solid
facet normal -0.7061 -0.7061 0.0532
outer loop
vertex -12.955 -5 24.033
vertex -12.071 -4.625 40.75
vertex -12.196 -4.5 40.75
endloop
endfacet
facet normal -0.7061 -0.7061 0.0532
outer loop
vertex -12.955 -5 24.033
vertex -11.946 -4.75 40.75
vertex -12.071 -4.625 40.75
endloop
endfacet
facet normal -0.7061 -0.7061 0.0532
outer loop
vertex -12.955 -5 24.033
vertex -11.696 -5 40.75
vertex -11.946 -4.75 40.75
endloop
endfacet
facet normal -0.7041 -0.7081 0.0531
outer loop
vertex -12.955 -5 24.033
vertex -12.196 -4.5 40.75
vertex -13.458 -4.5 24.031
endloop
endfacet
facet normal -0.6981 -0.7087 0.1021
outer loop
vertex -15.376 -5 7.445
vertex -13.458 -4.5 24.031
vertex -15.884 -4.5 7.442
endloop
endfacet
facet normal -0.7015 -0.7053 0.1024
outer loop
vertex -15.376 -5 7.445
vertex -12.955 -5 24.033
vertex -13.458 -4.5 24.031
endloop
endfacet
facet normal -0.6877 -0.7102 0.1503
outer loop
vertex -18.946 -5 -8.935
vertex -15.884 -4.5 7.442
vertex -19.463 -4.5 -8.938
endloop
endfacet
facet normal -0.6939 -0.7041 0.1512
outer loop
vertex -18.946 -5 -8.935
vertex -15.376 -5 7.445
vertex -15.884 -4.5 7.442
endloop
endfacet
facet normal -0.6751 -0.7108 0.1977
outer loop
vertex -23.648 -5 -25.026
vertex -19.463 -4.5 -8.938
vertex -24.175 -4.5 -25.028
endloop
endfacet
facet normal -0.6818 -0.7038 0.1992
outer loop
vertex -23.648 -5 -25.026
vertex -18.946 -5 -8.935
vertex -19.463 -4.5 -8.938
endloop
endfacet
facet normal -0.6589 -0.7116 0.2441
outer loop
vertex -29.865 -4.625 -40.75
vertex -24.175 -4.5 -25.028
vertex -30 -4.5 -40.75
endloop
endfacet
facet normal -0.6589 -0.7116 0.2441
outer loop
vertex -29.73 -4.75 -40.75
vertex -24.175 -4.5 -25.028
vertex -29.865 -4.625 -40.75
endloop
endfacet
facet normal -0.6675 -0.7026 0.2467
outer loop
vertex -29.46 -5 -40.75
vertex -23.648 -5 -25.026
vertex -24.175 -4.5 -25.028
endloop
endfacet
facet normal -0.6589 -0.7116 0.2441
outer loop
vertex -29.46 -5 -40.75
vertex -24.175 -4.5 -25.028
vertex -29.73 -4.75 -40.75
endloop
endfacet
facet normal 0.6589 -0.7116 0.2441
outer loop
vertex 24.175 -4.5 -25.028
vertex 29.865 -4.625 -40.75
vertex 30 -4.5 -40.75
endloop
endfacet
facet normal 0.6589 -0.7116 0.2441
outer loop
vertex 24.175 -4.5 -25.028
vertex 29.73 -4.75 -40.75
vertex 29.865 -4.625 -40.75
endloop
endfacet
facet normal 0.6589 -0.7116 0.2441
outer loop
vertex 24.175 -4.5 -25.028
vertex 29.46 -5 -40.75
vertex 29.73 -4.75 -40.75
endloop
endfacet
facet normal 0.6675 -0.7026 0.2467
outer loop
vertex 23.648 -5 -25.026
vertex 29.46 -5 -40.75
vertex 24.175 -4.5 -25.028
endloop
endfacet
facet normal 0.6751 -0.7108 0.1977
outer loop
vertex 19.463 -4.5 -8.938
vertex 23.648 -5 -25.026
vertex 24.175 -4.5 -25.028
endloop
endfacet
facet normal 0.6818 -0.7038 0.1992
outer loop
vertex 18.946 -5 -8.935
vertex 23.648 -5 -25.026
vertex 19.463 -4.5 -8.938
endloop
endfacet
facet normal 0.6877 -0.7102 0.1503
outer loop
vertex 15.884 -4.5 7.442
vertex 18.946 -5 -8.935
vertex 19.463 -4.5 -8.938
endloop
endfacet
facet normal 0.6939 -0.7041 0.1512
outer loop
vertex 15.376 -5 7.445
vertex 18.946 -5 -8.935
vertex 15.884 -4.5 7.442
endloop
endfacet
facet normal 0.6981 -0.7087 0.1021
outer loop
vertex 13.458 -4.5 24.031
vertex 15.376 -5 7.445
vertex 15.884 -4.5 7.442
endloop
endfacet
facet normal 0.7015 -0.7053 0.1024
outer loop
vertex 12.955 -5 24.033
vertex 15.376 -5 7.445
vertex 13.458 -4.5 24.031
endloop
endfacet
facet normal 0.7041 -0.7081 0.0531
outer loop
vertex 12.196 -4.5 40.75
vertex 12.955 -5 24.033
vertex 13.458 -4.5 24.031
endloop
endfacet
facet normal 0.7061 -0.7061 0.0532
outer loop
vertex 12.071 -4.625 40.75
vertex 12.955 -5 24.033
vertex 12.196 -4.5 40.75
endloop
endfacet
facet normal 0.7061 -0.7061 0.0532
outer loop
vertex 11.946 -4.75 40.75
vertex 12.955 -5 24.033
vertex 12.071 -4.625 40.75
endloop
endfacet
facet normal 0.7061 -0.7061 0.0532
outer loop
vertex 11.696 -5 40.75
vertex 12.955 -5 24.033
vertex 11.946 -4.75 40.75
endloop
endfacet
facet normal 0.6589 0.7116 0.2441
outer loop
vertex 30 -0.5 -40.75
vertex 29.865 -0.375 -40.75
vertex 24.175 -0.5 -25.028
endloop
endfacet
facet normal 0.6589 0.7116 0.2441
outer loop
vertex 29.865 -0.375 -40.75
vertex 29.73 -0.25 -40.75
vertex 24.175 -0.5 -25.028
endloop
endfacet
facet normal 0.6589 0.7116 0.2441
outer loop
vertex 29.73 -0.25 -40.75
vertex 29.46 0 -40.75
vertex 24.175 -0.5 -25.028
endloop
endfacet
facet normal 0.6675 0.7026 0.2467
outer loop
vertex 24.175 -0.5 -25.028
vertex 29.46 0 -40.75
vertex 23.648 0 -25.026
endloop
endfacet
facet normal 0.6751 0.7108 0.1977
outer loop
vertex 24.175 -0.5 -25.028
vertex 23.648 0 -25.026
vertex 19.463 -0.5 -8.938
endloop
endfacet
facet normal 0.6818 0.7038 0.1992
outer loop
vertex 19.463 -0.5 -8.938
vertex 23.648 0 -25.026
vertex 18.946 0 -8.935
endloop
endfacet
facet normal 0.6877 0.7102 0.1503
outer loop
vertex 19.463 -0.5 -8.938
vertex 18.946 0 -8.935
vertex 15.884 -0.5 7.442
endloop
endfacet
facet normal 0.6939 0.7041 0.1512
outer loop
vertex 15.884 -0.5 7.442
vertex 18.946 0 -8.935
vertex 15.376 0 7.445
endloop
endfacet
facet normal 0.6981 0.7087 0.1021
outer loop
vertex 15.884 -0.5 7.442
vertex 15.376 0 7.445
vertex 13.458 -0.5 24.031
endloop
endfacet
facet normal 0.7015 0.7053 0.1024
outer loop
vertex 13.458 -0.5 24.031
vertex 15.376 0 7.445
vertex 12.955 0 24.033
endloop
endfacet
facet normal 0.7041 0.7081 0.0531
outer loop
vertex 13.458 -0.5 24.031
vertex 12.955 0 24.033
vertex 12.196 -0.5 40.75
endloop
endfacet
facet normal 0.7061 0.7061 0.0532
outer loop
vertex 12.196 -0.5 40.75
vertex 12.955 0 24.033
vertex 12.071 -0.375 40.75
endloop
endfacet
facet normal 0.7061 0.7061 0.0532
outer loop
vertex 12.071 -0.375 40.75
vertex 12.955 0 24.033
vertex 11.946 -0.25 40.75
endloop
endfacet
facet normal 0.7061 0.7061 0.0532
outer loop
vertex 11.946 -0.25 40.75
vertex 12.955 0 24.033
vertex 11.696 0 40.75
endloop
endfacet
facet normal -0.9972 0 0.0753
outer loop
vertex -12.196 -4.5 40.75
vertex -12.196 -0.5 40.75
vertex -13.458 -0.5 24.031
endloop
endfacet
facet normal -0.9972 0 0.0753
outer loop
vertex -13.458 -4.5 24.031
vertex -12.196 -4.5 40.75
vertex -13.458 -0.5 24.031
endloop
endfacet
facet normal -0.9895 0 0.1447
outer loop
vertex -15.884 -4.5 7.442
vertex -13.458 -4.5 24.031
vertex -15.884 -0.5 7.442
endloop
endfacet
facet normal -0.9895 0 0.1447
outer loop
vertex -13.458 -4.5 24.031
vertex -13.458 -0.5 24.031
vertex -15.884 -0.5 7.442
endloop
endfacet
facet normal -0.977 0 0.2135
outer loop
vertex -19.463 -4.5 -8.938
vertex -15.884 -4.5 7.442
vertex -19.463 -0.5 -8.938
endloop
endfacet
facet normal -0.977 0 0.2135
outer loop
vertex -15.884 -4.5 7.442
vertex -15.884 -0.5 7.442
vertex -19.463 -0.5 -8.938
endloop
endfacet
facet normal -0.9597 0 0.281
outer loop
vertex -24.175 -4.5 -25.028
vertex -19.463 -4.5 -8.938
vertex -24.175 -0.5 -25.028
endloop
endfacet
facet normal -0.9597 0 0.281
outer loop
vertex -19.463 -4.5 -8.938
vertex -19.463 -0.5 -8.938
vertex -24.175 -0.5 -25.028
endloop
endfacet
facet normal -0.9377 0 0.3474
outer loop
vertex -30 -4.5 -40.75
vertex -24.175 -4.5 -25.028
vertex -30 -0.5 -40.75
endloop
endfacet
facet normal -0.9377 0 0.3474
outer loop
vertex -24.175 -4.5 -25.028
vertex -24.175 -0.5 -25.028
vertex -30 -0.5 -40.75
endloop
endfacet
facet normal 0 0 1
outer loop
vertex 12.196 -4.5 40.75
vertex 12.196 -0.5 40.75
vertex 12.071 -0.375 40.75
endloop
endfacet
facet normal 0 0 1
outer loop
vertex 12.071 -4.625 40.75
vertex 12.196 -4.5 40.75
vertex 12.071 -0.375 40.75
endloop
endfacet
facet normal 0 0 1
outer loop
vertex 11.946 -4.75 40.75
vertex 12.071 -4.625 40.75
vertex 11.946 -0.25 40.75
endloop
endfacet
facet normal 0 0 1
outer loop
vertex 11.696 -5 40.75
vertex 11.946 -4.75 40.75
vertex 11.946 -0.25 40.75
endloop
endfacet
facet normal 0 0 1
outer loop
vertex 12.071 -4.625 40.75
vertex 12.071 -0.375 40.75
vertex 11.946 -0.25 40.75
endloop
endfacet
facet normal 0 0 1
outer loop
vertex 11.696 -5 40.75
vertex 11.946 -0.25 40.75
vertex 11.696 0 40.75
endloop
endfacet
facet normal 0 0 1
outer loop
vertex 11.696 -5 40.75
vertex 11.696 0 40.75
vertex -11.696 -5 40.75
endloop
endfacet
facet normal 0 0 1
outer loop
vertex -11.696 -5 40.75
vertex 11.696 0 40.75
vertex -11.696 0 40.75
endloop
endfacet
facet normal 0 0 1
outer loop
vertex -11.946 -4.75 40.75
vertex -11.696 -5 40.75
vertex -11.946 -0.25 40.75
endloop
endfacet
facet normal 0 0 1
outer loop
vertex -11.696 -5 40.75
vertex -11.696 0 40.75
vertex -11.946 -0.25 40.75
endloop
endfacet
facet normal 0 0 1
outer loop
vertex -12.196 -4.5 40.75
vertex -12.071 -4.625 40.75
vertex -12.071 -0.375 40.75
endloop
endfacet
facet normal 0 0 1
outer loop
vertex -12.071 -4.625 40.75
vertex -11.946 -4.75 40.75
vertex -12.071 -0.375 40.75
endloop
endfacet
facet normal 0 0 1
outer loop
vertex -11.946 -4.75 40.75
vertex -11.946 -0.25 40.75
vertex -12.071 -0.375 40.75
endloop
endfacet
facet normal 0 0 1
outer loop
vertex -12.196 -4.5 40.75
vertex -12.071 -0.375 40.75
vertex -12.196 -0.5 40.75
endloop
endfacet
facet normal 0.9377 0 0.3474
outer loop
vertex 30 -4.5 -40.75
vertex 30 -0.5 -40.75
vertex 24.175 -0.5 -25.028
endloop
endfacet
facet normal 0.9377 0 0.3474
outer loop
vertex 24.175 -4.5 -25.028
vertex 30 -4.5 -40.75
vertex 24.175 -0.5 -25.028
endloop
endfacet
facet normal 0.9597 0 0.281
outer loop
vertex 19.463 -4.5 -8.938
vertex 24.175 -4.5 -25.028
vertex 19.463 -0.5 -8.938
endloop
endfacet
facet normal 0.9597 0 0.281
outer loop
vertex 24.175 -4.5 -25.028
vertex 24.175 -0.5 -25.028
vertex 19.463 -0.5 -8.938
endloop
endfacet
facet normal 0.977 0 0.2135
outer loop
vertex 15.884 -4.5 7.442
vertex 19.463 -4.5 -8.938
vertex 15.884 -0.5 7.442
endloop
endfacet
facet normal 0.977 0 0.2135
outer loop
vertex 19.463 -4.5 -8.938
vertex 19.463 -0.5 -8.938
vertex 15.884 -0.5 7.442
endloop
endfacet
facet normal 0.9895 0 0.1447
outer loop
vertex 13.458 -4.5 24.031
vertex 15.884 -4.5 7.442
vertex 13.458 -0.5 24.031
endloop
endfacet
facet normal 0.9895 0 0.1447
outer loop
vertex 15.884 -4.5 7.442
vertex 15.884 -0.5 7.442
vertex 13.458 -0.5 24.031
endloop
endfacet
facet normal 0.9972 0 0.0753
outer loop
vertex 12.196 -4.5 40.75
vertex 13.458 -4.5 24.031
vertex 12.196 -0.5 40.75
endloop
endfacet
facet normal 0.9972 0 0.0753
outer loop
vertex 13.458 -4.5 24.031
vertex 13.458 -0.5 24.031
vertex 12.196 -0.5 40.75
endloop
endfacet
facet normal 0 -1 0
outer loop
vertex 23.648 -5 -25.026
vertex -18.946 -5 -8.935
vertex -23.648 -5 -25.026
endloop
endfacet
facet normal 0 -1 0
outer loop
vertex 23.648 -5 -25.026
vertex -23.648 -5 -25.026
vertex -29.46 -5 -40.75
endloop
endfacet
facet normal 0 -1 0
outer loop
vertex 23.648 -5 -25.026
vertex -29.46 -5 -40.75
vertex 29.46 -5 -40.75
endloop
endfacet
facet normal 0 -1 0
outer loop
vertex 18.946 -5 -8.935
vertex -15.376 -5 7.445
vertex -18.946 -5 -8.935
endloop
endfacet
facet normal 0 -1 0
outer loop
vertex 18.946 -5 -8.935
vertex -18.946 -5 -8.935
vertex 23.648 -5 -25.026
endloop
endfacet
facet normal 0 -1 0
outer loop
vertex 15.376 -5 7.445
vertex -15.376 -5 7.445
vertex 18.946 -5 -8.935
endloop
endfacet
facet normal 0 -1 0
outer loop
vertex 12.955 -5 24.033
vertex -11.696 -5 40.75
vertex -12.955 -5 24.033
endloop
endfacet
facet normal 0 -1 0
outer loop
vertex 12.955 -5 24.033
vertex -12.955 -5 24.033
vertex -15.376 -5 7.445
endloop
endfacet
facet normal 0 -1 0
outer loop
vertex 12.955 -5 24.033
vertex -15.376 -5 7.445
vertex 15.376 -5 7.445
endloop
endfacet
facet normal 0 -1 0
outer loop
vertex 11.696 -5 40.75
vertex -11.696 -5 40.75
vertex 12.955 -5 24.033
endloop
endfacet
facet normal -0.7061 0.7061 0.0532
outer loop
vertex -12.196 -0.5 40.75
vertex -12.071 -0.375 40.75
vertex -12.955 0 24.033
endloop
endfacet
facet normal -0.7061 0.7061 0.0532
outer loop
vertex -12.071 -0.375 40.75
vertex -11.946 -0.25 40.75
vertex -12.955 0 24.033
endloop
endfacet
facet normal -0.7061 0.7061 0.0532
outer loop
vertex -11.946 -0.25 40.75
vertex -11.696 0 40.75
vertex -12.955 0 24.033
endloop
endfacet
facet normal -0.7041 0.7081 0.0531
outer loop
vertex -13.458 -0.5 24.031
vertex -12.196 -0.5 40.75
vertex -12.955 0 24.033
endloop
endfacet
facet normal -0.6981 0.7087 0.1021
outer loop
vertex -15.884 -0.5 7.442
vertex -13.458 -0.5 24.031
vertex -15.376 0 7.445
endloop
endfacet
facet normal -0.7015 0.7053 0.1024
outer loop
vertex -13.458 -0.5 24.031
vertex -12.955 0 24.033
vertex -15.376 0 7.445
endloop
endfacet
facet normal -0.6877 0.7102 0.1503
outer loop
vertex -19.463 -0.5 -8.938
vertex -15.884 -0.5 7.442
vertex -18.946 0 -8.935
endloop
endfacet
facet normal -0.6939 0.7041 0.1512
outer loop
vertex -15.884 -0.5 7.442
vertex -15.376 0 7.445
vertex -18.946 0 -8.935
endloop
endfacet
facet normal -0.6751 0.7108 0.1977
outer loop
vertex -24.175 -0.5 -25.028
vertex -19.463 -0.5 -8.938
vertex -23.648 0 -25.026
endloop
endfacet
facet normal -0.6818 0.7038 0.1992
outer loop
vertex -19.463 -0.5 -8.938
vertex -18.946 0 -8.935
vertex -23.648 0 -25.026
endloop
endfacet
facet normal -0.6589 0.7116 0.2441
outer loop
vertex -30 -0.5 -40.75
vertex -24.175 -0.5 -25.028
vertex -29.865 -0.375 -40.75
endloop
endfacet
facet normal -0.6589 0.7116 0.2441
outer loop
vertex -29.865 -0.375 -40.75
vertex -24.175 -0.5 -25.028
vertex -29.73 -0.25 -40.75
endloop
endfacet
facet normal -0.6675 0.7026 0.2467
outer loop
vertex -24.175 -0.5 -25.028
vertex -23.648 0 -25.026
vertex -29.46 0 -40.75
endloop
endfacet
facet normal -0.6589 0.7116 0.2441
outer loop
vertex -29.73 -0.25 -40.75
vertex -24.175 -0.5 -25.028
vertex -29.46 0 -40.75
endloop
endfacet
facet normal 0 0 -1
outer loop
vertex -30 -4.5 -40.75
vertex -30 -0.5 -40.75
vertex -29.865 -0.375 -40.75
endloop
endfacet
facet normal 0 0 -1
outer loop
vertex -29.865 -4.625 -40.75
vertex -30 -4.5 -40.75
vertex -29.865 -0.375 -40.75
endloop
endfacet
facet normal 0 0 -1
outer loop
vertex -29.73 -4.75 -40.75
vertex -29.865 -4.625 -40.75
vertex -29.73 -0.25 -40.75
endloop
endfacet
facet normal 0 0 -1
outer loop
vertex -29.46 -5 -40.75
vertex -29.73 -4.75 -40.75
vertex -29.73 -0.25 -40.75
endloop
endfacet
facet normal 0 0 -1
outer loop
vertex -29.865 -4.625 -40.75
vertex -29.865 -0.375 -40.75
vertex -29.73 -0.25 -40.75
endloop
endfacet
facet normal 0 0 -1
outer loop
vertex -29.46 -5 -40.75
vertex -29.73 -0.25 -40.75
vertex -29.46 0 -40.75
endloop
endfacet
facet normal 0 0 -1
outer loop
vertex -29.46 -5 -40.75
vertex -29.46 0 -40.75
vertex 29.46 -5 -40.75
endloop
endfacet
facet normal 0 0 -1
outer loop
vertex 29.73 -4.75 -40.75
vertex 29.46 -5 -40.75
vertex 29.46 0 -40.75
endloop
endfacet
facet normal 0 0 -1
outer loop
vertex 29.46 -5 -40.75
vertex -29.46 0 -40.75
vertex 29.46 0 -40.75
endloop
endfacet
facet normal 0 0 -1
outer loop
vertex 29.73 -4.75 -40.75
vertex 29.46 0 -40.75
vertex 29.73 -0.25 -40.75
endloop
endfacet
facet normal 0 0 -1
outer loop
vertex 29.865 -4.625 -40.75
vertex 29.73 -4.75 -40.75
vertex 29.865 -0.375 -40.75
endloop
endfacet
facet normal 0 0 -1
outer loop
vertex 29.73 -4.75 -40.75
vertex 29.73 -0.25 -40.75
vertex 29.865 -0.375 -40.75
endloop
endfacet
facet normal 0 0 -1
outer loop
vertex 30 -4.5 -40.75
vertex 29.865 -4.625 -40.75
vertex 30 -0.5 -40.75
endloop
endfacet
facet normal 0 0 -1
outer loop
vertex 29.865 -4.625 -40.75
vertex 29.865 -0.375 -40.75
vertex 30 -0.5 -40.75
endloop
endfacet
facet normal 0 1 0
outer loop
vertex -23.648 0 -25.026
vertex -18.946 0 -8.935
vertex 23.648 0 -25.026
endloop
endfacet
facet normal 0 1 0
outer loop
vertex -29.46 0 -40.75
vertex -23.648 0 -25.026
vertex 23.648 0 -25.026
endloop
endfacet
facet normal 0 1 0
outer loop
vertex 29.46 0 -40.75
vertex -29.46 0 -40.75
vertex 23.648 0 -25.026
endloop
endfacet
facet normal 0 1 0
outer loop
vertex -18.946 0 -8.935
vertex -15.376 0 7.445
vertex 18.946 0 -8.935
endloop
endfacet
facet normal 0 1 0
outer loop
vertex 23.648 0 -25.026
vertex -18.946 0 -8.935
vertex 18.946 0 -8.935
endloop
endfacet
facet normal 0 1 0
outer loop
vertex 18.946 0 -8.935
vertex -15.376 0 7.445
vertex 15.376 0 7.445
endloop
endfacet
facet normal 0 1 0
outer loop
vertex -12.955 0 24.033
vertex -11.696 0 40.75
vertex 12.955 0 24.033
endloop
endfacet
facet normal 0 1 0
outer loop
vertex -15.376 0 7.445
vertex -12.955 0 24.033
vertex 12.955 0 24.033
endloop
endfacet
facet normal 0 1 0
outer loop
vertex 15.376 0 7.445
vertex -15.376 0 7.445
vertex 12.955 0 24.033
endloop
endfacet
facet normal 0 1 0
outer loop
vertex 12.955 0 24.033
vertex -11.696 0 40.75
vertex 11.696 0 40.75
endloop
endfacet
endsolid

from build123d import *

# Parameters (mm, degrees)
F1_DEPTH = 5
F2_SIZE  = 0.5


# Not quite as in the source:
# - ends of sketch curves that miss each other by under 0.0002 mm in the source are joined


with BuildPart() as f1:
    # F0 (on Front) → F1 (new body)
    with BuildSketch(Plane.XZ):
        with BuildLine():
            Line((12.196068, 40.75), (-12.196068, 40.75))
            ThreePointArc((-12.196068, 40.75), (-17.5303965634, -0.7793616591), (-30, -40.75))
            Line((-30, -40.75), (30, -40.75))
            ThreePointArc((30, -40.75), (17.5303965634, -0.7793616591), (12.196068, 40.75))
        make_face()
    extrude(amount=F1_DEPTH)

    # F2
    f2_edges = [f1.edges().sort_by_distance(p)[0] for p in [
        (-17.530397, 0, -0.779362),
        (-17.530397, -5, -0.779362),
        (17.530397, -5, -0.779362),
        (17.530397, 0, -0.779362),
    ]]
    chamfer(f2_edges, length=F2_SIZE)


solid = f1.part
